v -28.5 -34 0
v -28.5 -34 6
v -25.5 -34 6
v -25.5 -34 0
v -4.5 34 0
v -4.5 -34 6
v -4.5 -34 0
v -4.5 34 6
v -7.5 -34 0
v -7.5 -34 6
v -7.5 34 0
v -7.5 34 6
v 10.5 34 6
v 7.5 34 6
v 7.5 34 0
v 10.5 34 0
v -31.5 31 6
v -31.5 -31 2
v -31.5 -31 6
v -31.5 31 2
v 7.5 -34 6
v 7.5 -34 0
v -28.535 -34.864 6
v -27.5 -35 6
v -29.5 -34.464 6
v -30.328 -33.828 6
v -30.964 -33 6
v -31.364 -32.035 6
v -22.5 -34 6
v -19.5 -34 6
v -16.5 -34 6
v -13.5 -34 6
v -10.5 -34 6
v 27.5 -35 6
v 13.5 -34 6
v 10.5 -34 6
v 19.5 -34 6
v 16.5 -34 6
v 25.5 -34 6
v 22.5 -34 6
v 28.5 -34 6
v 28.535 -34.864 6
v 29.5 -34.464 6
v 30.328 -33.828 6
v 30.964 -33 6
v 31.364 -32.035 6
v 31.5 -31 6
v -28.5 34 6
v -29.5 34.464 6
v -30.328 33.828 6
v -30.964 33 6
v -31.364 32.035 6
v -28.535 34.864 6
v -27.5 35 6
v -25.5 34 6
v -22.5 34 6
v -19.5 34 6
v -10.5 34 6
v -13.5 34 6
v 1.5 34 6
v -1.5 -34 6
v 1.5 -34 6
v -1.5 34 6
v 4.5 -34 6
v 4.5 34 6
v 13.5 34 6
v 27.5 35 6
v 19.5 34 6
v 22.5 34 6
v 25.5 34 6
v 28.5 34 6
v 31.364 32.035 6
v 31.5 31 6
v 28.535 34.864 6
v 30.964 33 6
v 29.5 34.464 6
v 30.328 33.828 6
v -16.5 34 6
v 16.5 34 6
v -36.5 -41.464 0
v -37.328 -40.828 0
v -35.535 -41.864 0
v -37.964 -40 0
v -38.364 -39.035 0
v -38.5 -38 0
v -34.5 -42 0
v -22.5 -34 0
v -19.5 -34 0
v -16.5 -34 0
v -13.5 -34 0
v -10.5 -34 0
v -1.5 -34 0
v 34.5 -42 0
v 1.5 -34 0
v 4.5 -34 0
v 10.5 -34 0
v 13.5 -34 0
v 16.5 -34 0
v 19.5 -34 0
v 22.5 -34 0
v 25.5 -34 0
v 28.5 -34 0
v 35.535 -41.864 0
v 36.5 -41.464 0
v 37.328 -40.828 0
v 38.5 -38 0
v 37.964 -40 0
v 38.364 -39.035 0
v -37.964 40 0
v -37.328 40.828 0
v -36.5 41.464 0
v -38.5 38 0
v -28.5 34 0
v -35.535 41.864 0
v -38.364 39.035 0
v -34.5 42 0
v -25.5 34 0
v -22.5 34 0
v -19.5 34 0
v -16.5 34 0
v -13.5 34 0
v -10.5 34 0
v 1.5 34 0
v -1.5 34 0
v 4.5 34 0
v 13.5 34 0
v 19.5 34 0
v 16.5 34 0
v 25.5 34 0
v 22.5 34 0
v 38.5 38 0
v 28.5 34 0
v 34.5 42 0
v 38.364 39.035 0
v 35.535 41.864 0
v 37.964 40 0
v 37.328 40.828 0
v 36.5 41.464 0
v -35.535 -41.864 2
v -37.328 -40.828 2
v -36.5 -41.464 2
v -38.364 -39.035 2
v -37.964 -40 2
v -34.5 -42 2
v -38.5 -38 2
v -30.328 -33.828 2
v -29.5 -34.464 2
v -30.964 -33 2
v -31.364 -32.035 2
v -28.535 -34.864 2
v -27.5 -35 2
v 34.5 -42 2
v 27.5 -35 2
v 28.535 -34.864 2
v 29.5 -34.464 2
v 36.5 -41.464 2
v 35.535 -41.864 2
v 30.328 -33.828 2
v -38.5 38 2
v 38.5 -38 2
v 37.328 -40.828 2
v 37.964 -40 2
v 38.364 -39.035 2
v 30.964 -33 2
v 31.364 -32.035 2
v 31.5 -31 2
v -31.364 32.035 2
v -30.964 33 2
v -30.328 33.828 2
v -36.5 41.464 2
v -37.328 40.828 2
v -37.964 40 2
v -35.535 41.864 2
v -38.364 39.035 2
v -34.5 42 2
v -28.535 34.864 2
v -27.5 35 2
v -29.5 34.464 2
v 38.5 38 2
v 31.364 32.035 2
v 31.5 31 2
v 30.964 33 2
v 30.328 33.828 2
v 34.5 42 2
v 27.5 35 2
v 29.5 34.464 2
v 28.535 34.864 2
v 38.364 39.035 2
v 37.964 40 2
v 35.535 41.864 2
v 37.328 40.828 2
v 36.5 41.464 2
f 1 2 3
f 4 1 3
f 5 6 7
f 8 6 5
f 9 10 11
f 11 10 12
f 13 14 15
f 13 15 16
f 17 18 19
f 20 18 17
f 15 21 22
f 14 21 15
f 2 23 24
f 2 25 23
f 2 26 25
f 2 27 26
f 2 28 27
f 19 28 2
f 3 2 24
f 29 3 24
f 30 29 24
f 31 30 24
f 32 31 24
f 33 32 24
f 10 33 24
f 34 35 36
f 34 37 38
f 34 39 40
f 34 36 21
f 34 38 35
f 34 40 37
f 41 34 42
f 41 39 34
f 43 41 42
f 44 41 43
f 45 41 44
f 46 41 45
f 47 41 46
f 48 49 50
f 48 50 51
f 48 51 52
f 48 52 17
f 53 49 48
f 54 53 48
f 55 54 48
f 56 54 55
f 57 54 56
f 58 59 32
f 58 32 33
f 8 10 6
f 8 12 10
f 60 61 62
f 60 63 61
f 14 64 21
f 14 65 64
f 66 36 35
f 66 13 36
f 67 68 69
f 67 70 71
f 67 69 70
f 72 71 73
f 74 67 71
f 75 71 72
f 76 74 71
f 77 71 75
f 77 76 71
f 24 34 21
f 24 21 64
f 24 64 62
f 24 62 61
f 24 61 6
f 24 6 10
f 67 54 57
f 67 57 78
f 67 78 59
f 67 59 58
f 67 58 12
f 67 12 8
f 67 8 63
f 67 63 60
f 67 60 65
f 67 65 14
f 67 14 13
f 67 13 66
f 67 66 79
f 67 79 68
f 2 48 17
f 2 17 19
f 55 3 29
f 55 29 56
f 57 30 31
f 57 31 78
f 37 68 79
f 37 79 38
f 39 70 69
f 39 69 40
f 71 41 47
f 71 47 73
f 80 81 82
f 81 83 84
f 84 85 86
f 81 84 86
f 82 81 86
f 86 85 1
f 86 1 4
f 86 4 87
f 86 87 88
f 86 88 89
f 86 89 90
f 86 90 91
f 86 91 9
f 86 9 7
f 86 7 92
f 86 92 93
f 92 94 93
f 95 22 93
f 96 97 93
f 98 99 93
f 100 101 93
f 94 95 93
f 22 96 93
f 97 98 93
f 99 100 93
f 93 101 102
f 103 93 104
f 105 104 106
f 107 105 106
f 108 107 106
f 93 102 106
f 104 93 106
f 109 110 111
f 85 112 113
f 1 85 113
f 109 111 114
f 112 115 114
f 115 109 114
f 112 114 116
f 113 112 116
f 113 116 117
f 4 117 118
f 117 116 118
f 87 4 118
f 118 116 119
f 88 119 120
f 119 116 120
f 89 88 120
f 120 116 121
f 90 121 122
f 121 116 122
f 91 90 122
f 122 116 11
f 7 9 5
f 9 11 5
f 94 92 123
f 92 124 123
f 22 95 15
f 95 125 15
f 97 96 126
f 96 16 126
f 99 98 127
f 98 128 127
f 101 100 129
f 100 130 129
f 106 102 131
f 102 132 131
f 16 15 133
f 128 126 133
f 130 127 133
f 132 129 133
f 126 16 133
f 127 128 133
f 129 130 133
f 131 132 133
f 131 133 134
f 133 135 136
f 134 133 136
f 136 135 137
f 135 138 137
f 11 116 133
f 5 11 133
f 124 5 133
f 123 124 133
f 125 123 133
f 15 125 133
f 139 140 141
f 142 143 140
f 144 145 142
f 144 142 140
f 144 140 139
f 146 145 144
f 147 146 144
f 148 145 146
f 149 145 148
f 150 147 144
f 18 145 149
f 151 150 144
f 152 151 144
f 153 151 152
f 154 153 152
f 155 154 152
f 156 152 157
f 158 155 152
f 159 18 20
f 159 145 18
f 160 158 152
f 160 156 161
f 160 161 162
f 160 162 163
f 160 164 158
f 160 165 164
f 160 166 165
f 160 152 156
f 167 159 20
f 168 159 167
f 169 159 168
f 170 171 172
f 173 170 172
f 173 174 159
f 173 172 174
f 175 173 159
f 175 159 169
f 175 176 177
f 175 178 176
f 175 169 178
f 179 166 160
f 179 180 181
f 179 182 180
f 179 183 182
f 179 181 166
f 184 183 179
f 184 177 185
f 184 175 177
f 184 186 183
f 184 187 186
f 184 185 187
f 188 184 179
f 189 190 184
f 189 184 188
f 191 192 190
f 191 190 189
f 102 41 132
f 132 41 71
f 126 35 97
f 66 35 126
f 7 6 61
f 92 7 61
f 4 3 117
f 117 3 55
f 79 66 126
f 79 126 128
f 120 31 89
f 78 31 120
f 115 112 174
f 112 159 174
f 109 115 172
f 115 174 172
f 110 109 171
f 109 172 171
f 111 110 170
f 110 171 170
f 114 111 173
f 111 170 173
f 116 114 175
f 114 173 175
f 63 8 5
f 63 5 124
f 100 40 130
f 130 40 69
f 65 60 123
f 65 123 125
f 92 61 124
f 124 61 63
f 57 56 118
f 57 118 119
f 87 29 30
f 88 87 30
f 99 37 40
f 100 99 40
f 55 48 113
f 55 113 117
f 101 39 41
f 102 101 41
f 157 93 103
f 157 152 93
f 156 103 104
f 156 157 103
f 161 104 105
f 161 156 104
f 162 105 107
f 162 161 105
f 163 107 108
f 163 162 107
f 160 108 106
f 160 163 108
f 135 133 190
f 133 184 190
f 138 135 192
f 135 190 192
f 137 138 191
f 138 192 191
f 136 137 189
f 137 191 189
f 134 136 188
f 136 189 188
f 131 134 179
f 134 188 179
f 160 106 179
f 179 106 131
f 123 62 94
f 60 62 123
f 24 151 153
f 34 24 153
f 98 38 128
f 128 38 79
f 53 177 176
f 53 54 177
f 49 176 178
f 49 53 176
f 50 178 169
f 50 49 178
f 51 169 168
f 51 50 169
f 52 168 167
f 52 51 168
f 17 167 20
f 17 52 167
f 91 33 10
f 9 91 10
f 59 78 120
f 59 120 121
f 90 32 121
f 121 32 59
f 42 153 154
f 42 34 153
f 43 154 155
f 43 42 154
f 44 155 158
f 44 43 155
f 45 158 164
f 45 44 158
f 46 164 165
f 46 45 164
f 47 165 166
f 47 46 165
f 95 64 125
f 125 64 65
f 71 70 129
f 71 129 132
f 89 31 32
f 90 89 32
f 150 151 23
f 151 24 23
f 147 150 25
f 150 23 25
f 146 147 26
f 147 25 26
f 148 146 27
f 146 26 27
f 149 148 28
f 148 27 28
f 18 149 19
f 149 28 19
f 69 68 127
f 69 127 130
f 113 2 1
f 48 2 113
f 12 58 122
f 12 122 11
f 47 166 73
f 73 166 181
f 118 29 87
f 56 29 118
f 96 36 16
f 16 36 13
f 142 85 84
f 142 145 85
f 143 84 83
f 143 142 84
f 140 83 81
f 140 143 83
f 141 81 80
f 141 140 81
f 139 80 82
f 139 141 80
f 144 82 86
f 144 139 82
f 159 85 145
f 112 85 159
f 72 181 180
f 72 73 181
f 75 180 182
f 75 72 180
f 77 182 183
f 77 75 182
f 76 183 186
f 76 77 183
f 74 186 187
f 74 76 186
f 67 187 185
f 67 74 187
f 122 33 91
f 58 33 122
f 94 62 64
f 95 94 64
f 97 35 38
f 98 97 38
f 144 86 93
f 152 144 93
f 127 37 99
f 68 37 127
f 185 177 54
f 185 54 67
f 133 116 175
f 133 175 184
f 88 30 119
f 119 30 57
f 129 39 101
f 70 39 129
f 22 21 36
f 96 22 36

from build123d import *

# Parameters (mm, degrees)
F0_W     = 77
F0_H     = 84
F1_DEPTH = 2
F2_W     = 63
F2_H     = 70
F3_DEPTH = 4
F4_W     = 3
F4_H     = 68
F5_DEPTH = 6.001
F6_R     = 4


with BuildPart() as f1:
    # F0 (on Top) → F1 (new body)
    with BuildSketch(Plane.XY):
        Rectangle(F0_W, F0_H)
    extrude(amount=F1_DEPTH)

    # F2 (on face) → F3 (join)
    with BuildSketch(Plane.XY.offset(2)):
        Rectangle(F2_W, F2_H)
    extrude(amount=F3_DEPTH)

    # F4 (on face) → F5 (cut, through all)
    with BuildSketch(Plane.XY.offset(6)):
        with Locations((3, 0)):
            Rectangle(F4_W, F4_H)
        with Locations((9, 0)):
            Rectangle(F4_W, F4_H)
        with Locations((15, 0)):
            Rectangle(F4_W, F4_H)
        with Locations((21, 0)):
            Rectangle(F4_W, F4_H)
        with Locations((27, 0)):
            Rectangle(F4_W, F4_H)
        with Locations((-3, 0)):
            Rectangle(F4_W, F4_H)
        with Locations((-9, 0)):
            Rectangle(F4_W, F4_H)
        with Locations((-15, 0)):
            Rectangle(F4_W, F4_H)
        with Locations((-21, 0)):
            Rectangle(F4_W, F4_H)
        with Locations((-27, 0)):
            Rectangle(F4_W, F4_H)
    extrude(amount=-F5_DEPTH, mode=Mode.SUBTRACT)

    # F6
    f6_edges = [f1.edges().sort_by_distance(p)[0] for p in [
        (-38.5, -42, 1),
        (-31.5, -35, 4),
        (31.5, -35, 4),
        (38.5, -42, 1),
        (-31.5, 35, 4),
        (-38.5, 42, 1),
        (31.5, 35, 4),
        (38.5, 42, 1),
    ]]
    fillet(f6_edges, radius=F6_R)


solid = f1.part
